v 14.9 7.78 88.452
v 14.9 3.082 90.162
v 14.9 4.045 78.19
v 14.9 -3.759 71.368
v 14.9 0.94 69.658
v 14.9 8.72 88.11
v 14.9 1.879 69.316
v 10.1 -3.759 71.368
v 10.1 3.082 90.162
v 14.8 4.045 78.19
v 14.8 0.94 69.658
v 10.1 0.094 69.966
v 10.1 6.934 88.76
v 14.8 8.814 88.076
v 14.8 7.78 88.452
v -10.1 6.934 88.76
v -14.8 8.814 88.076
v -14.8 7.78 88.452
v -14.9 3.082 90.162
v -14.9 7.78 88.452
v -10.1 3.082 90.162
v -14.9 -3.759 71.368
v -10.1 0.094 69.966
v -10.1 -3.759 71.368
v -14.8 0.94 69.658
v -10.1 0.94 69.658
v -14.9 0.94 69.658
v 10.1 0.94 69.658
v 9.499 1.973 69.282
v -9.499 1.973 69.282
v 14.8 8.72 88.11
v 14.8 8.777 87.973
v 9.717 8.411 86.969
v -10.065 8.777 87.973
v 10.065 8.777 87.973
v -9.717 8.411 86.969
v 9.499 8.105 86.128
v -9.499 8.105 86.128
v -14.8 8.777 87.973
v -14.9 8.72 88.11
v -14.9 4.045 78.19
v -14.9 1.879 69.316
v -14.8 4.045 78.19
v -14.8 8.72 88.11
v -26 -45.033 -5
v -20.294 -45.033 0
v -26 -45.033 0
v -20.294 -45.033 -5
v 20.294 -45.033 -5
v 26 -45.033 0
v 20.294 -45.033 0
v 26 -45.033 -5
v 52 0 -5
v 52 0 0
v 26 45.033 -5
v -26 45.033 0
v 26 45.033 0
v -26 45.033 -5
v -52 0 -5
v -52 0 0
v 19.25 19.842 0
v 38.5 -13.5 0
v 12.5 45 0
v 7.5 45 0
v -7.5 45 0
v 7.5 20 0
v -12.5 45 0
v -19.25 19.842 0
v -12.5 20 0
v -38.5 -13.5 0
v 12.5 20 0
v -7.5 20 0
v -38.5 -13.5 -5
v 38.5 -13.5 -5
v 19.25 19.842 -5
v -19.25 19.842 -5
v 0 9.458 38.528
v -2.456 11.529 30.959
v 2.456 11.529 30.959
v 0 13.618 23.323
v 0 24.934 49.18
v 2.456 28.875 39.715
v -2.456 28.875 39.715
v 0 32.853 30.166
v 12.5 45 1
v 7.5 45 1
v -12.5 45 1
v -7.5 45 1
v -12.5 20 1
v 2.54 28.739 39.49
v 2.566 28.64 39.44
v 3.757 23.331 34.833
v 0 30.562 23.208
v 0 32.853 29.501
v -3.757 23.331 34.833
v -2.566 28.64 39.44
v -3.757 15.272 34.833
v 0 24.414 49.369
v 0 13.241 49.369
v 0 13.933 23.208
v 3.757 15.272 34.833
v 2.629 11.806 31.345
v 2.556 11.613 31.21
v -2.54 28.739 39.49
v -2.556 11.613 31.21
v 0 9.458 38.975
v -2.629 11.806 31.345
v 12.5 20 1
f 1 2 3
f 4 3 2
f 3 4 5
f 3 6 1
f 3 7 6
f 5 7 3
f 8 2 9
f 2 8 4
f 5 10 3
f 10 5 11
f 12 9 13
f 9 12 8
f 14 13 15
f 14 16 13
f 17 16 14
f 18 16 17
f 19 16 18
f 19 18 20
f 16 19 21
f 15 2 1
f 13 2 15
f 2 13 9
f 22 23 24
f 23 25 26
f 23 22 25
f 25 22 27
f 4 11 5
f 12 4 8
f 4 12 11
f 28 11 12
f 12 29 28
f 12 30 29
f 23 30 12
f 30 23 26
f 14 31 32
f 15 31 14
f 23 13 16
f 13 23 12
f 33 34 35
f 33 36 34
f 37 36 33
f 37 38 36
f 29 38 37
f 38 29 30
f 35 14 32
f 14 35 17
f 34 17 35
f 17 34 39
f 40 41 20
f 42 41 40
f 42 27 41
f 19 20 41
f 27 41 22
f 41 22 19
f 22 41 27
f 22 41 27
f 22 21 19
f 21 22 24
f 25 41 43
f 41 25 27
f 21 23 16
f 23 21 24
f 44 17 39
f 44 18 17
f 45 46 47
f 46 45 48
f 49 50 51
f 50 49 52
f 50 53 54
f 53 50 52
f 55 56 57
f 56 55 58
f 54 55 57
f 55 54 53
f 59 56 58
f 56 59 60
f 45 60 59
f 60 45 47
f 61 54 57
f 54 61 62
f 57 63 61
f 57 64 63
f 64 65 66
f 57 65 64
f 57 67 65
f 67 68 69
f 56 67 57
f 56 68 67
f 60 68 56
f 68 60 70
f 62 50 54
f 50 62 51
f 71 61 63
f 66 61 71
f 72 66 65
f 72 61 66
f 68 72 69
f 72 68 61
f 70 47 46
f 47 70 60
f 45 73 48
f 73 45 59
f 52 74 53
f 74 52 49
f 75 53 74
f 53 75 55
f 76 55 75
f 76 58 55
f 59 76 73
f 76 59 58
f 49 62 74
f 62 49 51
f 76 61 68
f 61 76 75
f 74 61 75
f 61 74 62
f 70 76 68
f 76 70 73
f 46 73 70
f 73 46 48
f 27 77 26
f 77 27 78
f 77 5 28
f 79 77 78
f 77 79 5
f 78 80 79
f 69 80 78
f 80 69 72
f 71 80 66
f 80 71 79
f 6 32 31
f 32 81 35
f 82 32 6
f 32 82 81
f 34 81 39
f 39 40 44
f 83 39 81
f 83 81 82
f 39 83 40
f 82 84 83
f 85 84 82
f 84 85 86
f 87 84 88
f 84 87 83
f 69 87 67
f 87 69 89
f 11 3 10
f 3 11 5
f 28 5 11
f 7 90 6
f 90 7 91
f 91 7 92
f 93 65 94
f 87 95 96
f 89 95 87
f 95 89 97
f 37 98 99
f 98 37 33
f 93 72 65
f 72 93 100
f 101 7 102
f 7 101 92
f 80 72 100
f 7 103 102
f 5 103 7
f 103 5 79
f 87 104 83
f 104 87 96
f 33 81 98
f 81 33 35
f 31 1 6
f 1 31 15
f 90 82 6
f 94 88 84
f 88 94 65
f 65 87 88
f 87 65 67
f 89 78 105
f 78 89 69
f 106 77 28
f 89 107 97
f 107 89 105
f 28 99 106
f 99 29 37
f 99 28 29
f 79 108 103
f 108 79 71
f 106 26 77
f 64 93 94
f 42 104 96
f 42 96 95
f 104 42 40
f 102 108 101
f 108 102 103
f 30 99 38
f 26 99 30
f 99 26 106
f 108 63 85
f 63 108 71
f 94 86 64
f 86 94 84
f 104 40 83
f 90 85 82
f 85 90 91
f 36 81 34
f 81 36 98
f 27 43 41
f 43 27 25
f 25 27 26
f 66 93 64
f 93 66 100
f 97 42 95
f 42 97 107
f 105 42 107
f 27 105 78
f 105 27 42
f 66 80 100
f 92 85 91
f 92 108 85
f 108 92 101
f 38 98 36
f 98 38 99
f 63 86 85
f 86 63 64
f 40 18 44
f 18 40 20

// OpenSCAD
module foot() {
    rotate([70,0,0]) {
    translate([10.1,0,-1]) cube([4.8,20,5]);
    translate([0,0,-2.1]) cube([14.8,20,2]);
    }
}
module foot_supp() {
    rotate([70,0,0]) {
    translate([10.1,0,-1]) cube([4.8,20,5]);
    }
}

translate([0,0,70]) {
    foot();
    mirror([1,0,0]) foot();
}

hull() {
    #translate([0,0,70]) rotate([70,0,0])translate([10.1,0,-2]) cube([4.8,20,1]);
    translate([-25/2,20,0]) cube([5,25,1]);
}

mirror([1,0,0]) hull() {
    translate([0,0,70]) rotate([70,0,0])translate([10.1,0,-2]) cube([4.8,20,1]);
    translate([-25/2,20,0]) cube([5,25,1]);
}
difference() {
translate([0,0,-5]) cylinder(5, d=104, $fn=6);
translate([0,-13.5,-6]) cylinder(7, d=104-27, $fn=6);
}
